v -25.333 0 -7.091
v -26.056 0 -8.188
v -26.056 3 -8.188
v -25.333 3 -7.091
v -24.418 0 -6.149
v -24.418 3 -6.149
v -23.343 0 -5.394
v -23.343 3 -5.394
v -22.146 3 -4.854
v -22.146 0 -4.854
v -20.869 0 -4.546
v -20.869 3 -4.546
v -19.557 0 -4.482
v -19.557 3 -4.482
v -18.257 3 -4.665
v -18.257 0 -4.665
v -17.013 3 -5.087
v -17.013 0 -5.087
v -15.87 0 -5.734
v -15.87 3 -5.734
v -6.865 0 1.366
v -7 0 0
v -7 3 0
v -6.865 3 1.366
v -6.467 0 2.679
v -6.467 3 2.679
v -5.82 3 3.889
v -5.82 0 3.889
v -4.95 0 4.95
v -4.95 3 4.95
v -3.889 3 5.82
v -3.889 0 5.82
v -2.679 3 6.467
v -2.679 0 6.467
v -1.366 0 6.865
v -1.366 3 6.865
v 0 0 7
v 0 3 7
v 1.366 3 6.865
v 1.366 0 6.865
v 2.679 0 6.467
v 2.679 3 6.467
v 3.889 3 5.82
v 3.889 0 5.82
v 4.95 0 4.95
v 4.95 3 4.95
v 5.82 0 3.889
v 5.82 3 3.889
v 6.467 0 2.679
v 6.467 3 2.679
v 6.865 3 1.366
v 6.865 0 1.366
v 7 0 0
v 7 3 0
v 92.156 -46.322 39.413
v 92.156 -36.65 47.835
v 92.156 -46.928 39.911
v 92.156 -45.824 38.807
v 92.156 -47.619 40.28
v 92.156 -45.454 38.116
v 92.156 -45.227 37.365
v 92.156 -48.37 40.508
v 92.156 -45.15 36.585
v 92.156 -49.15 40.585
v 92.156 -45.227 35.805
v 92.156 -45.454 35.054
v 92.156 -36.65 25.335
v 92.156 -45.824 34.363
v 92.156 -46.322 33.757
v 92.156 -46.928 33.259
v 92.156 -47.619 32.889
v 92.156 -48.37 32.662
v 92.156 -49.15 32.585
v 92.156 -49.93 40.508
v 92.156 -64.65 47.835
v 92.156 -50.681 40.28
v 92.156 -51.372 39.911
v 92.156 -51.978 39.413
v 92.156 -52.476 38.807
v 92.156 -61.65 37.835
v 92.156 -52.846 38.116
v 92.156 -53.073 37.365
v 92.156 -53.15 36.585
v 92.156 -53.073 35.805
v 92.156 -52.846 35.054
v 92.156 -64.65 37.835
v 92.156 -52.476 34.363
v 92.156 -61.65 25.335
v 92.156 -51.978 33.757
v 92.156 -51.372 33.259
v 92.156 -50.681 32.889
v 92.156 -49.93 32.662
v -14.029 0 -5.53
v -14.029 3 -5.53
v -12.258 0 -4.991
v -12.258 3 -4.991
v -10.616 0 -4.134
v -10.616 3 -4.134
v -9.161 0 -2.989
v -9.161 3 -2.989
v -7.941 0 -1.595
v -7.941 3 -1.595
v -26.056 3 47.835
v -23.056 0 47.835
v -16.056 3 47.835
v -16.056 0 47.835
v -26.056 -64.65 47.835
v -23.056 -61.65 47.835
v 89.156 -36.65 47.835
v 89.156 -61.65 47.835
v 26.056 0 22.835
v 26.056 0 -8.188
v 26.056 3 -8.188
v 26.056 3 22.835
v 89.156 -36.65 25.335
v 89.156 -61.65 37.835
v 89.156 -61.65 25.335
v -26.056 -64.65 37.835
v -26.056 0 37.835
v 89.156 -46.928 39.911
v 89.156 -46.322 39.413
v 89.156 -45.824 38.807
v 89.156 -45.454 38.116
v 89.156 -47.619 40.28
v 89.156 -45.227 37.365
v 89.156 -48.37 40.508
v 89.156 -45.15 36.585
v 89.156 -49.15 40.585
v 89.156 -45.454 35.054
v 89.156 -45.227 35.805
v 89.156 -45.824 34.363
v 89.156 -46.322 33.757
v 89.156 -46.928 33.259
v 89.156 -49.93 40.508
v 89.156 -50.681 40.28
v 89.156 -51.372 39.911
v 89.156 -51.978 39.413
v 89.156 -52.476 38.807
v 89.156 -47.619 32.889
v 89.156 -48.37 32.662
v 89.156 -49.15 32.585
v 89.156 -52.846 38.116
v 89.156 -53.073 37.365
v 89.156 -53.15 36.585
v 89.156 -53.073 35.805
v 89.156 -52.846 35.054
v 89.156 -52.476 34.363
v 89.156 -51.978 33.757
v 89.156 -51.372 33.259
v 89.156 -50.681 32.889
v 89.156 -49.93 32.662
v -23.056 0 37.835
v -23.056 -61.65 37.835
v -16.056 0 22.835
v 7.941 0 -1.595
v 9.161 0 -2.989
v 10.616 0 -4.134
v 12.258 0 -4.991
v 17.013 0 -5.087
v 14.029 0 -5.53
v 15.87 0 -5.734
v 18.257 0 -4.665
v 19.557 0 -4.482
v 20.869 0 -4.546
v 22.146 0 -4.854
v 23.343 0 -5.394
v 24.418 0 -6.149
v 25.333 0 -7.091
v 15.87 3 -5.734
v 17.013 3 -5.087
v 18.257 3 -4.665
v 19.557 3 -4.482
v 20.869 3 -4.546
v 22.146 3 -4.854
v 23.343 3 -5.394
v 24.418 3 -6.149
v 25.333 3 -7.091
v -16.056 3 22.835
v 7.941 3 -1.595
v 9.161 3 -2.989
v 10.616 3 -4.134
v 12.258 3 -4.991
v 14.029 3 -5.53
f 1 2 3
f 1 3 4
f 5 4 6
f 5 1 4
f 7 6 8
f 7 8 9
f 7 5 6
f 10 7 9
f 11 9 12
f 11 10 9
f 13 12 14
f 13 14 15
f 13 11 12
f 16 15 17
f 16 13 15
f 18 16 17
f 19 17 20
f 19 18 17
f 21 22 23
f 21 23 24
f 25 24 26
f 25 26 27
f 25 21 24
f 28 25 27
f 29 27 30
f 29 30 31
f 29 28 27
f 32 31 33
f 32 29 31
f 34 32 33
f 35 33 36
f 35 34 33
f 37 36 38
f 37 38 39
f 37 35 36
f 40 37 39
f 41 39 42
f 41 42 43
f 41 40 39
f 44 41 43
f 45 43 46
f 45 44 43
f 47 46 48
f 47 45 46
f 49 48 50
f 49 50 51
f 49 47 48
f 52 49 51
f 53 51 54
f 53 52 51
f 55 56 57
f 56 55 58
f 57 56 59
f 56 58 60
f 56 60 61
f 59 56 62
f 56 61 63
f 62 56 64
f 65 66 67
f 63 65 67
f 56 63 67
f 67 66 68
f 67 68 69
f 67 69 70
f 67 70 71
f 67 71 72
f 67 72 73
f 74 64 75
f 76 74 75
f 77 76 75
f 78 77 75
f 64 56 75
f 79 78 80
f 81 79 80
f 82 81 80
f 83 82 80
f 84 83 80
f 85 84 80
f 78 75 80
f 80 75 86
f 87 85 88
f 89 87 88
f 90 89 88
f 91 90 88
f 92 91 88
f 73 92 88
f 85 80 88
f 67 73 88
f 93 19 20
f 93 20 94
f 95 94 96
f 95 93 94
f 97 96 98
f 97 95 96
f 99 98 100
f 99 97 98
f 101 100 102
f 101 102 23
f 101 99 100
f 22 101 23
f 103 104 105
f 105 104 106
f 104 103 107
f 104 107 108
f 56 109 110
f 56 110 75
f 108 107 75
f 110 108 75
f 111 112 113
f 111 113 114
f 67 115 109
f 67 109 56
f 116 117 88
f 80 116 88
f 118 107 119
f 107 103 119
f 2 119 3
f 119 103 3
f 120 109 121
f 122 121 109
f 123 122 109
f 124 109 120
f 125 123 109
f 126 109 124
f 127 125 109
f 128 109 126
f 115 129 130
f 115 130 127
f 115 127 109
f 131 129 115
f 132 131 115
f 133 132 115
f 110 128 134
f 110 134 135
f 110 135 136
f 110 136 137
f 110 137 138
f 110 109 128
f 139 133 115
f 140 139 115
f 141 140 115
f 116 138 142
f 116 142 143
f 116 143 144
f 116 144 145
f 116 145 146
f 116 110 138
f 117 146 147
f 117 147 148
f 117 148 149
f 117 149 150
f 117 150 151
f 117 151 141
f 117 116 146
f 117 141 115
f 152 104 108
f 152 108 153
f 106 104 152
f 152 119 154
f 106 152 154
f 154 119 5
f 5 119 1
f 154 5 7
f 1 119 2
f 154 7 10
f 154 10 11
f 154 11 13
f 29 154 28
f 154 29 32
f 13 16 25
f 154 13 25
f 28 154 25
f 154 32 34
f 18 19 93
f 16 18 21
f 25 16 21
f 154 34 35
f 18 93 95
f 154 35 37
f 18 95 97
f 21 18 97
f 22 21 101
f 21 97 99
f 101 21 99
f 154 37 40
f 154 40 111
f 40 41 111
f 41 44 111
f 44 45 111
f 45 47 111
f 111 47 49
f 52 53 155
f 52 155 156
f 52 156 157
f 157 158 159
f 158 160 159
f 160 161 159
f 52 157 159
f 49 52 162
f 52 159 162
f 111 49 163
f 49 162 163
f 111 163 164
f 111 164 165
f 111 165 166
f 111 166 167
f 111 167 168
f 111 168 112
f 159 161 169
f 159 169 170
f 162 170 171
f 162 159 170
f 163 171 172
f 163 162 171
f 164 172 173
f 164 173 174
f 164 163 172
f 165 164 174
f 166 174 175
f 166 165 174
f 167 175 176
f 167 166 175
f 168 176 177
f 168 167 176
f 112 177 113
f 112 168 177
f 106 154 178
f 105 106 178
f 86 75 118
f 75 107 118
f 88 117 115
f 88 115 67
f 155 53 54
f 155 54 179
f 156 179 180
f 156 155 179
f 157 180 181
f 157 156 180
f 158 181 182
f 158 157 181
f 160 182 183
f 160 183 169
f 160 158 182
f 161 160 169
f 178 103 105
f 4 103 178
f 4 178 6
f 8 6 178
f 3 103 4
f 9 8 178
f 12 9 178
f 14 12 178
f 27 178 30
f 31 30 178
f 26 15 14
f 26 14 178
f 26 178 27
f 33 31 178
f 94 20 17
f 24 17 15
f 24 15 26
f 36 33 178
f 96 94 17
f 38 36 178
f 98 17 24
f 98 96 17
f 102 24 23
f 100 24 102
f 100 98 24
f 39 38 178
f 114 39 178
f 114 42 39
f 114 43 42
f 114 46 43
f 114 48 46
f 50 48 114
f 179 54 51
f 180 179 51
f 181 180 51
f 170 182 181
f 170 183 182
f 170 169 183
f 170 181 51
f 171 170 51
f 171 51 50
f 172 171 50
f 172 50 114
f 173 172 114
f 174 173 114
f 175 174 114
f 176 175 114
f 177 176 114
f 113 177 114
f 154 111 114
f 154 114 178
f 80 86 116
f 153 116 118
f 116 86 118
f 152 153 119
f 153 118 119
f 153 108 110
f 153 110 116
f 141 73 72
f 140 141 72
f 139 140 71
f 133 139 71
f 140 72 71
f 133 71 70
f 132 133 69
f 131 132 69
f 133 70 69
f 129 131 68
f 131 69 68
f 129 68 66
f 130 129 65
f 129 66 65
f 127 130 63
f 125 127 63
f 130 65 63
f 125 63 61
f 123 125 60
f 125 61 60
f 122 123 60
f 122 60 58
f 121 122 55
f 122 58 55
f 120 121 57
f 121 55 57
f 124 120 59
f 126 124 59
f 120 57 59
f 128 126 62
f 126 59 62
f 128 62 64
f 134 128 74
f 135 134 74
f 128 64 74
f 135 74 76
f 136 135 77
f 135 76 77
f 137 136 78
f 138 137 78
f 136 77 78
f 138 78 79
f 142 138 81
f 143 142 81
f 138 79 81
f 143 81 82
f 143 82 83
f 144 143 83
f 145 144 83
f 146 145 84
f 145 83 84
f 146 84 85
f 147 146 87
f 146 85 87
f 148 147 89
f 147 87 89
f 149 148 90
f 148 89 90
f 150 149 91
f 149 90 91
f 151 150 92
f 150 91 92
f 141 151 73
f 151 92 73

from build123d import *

# Parameters (mm, degrees)
BOSS_EXTRUDE1_DEPTH = 3
SKETCH6_W           = 10
SKETCH6_H           = 3
BOSS_EXTRUDE5_DEPTH = 25
SKETCH8_W           = 3
SKETCH8_H           = 10
BOSS_EXTRUDE7_DEPTH = 64.65
SKETCH9_W           = 10
SKETCH9_H           = 3
BOSS_EXTRUDE8_DEPTH = 115.212
SKETCH10_W          = 3
SKETCH10_H          = 22.5
BOSS_EXTRUDE9_DEPTH = 25
SKETCH11_R          = 4
CUT_EXTRUDE1_DEPTH  = 3


with BuildPart() as part:
    # Sketch2 → Boss-Extrude1 (new body)
    with BuildSketch(Plane(origin=(0, 0, 0), x_dir=(1, 0, 0), z_dir=(0, 1, 0))):
        with BuildLine():
            Line((26.055569119, 8.188046441), (26.055569119, -22.834953559))
            Line((26.055569119, -22.834953559), (-26.055569119, -22.834953559))
            Line((-26.055569119, -22.834953559), (-26.055569119, 8.188046441))
            ThreePointArc((-26.055569119, 8.188046441), (-21.514872246, 4.669726518), (-15.870079226, 5.73406431))
            ThreePointArc((-15.870079226, 5.73406431), (-10.616247764, 4.133629141), (-7, 0))
            ThreePointArc((-7, 0), (0, -7), (7, 0))
            ThreePointArc((7, 0), (10.616247764, 4.133629141), (15.870079226, 5.73406431))
            ThreePointArc((15.870079226, 5.73406431), (21.514872246, 4.669726518), (26.055569119, 8.188046441))
        make_face()
    extrude(amount=BOSS_EXTRUDE1_DEPTH)

    # Sketch6 → Boss-Extrude5 (add)
    with BuildSketch(Plane.XY.offset(22.834953559)):
        with Locations((-21.055569119, 1.5)):
            Rectangle(SKETCH6_W, SKETCH6_H)
    extrude(amount=BOSS_EXTRUDE5_DEPTH)

    # Sketch8 → Boss-Extrude7 (add)
    with BuildSketch(Plane(origin=(0, 0, 0), x_dir=(-1, 0, 0), z_dir=(0, -1, 0))):
        with Locations((24.555569119, -42.834953559)):
            Rectangle(SKETCH8_W, SKETCH8_H)
    extrude(amount=BOSS_EXTRUDE7_DEPTH)

    # Sketch9 → Boss-Extrude8 (add)
    with BuildSketch(Plane(origin=(-23.055569119, 0, 0), x_dir=(0, 0, -1), z_dir=(1, 0, 0))):
        with Locations((-42.834953559, -63.15)):
            Rectangle(SKETCH9_W, SKETCH9_H)
    extrude(amount=BOSS_EXTRUDE8_DEPTH)

    # Sketch10 → Boss-Extrude9 (add)
    with BuildSketch(Plane(origin=(0, -61.65, 0), x_dir=(1, 0, 0), z_dir=(0, 1, 0))):
        with Locations((90.656430881, -36.584953559)):
            Rectangle(SKETCH10_W, SKETCH10_H)
    extrude(amount=BOSS_EXTRUDE9_DEPTH)

    # Sketch11 → Cut-Extrude1 (cut)
    with BuildSketch(Plane(origin=(92.156430881, 0, 0), x_dir=(0, 0, -1), z_dir=(1, 0, 0))):
        with Locations((-36.584953559, -49.15)):
            Circle(SKETCH11_R)
    extrude(amount=-CUT_EXTRUDE1_DEPTH, mode=Mode.SUBTRACT)


solid = part.part
